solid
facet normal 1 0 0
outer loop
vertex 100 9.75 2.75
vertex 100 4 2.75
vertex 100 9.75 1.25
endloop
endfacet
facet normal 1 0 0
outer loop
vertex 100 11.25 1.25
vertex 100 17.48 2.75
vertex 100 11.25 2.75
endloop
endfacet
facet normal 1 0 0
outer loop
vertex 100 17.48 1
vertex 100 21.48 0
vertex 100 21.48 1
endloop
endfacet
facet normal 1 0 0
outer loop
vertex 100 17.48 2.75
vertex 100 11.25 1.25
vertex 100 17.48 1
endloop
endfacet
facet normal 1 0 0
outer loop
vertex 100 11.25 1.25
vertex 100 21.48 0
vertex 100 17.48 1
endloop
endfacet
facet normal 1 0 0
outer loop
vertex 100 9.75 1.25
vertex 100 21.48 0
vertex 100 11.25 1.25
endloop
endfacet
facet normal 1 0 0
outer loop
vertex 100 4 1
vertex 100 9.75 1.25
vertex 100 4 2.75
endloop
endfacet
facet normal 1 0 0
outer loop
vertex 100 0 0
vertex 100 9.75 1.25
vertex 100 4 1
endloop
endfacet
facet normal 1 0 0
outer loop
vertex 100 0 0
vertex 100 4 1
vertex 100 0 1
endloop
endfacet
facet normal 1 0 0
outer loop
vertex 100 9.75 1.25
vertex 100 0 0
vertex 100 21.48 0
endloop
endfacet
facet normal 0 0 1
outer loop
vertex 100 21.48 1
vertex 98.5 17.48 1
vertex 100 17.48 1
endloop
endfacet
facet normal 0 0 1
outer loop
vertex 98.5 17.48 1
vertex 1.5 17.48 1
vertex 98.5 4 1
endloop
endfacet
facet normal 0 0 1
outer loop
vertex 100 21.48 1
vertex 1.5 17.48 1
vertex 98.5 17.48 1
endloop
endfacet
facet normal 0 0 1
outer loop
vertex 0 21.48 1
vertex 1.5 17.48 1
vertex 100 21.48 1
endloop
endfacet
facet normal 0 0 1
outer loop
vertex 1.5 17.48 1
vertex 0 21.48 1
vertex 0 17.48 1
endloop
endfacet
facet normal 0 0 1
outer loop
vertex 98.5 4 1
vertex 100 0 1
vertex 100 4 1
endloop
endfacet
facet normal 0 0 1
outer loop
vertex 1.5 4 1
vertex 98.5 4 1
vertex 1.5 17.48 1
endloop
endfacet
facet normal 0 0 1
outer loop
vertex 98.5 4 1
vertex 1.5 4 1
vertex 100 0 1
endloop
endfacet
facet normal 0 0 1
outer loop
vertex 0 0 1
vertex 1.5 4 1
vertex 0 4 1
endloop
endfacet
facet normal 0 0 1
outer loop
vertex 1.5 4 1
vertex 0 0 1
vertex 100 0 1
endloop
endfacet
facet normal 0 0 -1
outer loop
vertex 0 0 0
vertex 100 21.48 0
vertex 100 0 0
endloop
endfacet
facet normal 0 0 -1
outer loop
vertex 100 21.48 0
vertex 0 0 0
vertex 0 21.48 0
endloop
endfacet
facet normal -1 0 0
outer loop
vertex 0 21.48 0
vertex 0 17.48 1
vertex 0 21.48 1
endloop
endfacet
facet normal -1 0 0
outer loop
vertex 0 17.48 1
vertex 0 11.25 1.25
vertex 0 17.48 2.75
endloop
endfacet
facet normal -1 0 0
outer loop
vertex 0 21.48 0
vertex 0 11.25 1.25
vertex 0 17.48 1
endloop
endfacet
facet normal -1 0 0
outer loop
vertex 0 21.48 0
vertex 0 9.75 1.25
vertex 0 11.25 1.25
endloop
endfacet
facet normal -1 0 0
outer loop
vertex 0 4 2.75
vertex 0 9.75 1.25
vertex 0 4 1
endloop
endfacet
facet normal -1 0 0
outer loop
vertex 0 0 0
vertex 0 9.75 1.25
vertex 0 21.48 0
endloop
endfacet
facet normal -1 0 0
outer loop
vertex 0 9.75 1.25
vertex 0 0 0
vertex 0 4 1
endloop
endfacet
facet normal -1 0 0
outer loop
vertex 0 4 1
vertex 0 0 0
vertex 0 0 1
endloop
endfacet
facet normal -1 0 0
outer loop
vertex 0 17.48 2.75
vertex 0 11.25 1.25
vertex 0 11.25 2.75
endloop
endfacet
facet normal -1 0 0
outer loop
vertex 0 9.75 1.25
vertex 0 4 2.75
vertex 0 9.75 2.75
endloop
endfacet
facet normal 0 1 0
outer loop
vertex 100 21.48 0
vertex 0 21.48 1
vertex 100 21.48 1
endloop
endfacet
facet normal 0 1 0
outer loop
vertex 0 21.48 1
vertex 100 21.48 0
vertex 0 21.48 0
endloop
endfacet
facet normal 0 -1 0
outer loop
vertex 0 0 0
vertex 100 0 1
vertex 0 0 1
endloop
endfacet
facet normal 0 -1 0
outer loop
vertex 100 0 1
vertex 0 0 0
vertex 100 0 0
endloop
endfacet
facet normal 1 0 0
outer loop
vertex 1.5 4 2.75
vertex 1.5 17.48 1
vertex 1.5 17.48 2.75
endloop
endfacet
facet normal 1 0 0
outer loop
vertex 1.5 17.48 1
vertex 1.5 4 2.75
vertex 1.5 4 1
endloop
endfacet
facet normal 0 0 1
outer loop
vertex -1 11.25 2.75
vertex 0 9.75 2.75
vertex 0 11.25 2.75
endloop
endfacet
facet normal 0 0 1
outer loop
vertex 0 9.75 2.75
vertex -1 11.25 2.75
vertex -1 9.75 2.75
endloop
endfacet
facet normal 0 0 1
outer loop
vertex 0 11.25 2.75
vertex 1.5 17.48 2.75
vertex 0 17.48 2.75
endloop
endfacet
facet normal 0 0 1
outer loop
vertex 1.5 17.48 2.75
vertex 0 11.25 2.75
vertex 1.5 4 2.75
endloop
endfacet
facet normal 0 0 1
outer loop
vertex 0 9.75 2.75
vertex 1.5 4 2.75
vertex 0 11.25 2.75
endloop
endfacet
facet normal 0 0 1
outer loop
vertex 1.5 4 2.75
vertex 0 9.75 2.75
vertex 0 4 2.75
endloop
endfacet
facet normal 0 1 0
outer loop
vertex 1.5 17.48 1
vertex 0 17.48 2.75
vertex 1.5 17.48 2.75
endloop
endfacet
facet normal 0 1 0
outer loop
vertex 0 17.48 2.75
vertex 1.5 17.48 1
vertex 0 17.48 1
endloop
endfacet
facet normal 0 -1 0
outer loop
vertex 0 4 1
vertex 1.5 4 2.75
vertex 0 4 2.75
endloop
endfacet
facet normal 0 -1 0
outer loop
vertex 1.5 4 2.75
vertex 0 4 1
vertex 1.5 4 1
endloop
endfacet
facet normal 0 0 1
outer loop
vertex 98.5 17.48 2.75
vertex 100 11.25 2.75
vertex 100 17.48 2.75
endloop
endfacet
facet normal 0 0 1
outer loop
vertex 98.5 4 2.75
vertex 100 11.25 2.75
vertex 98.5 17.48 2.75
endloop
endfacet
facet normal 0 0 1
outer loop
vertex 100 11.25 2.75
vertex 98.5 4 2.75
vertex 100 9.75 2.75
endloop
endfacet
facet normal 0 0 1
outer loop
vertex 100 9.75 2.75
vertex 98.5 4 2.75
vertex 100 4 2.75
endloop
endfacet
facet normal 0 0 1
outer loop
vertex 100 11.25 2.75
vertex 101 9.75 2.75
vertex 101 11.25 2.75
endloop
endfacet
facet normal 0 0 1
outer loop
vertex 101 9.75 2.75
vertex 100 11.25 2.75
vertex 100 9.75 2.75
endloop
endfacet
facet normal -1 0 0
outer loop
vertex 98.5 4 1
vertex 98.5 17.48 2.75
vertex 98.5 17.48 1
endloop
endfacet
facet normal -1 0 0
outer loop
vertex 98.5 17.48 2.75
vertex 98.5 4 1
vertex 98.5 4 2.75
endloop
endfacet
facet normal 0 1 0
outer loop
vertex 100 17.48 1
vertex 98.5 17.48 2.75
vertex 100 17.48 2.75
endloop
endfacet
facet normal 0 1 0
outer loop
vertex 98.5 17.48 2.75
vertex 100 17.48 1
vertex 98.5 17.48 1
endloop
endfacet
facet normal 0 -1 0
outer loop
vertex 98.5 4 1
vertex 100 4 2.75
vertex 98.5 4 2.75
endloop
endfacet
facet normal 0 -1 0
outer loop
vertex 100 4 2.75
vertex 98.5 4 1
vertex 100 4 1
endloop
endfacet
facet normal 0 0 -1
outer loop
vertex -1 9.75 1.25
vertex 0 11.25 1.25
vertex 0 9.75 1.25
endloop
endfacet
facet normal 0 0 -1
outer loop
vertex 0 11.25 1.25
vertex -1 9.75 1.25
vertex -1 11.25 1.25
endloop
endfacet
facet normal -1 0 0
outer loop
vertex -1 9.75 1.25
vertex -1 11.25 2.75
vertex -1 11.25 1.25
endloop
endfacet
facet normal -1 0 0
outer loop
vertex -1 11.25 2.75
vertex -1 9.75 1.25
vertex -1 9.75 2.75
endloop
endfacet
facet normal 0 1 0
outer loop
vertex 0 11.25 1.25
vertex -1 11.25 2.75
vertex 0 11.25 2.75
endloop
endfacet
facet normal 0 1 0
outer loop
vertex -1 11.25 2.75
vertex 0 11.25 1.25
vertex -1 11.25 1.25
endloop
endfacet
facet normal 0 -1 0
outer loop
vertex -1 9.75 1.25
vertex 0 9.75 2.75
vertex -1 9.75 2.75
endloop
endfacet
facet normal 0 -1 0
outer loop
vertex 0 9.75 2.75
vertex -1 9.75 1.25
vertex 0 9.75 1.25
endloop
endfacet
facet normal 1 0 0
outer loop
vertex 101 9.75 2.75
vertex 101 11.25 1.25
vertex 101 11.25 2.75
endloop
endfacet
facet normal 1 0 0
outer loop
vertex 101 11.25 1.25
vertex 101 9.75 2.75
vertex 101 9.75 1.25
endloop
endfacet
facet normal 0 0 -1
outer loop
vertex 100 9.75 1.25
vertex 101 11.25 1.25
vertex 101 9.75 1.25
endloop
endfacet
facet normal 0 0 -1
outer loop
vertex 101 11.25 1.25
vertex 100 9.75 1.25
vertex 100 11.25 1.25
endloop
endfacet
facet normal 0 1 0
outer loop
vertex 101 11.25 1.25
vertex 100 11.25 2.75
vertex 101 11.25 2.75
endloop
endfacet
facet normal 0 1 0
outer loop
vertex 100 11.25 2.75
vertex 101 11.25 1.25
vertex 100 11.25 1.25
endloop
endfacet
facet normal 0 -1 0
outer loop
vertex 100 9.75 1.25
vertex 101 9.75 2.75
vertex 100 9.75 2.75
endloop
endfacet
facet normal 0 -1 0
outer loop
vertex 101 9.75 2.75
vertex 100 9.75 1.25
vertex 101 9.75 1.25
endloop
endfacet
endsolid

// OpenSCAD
//
//  StandFLoor.scad
//  SensorClock
//
//  created by yu2924 on 2026-09-21
//

$fn=100;

BoxWidth = 100;
FloorHeight = 21.48;
FloorThickness = 1.0;
ClawOffsetY = 9.5;
ClawDia = 2;
ClawDiaSmall = 1.5;
ClawAdjust = (ClawDia - ClawDiaSmall) / 2;

module boxfloor()
{
    // plate
    cube([BoxWidth, FloorHeight, FloorThickness]);
    // edges
    translate([0, 4, FloorThickness])
      cube([1.5, FloorHeight - 8, 2 - ClawAdjust]);
    translate([BoxWidth-1.5, 4, FloorThickness])
      cube([1.5, FloorHeight - 8, 2 - ClawAdjust]);
    // snapfit claws
    translate([-1, ClawOffsetY + ClawAdjust, FloorThickness + ClawAdjust])
      cube([2, ClawDiaSmall, ClawDiaSmall]);
    translate([BoxWidth-1, ClawOffsetY + ClawAdjust, FloorThickness + ClawAdjust])
      cube([2, ClawDiaSmall, ClawDiaSmall]);
}

boxfloor();
